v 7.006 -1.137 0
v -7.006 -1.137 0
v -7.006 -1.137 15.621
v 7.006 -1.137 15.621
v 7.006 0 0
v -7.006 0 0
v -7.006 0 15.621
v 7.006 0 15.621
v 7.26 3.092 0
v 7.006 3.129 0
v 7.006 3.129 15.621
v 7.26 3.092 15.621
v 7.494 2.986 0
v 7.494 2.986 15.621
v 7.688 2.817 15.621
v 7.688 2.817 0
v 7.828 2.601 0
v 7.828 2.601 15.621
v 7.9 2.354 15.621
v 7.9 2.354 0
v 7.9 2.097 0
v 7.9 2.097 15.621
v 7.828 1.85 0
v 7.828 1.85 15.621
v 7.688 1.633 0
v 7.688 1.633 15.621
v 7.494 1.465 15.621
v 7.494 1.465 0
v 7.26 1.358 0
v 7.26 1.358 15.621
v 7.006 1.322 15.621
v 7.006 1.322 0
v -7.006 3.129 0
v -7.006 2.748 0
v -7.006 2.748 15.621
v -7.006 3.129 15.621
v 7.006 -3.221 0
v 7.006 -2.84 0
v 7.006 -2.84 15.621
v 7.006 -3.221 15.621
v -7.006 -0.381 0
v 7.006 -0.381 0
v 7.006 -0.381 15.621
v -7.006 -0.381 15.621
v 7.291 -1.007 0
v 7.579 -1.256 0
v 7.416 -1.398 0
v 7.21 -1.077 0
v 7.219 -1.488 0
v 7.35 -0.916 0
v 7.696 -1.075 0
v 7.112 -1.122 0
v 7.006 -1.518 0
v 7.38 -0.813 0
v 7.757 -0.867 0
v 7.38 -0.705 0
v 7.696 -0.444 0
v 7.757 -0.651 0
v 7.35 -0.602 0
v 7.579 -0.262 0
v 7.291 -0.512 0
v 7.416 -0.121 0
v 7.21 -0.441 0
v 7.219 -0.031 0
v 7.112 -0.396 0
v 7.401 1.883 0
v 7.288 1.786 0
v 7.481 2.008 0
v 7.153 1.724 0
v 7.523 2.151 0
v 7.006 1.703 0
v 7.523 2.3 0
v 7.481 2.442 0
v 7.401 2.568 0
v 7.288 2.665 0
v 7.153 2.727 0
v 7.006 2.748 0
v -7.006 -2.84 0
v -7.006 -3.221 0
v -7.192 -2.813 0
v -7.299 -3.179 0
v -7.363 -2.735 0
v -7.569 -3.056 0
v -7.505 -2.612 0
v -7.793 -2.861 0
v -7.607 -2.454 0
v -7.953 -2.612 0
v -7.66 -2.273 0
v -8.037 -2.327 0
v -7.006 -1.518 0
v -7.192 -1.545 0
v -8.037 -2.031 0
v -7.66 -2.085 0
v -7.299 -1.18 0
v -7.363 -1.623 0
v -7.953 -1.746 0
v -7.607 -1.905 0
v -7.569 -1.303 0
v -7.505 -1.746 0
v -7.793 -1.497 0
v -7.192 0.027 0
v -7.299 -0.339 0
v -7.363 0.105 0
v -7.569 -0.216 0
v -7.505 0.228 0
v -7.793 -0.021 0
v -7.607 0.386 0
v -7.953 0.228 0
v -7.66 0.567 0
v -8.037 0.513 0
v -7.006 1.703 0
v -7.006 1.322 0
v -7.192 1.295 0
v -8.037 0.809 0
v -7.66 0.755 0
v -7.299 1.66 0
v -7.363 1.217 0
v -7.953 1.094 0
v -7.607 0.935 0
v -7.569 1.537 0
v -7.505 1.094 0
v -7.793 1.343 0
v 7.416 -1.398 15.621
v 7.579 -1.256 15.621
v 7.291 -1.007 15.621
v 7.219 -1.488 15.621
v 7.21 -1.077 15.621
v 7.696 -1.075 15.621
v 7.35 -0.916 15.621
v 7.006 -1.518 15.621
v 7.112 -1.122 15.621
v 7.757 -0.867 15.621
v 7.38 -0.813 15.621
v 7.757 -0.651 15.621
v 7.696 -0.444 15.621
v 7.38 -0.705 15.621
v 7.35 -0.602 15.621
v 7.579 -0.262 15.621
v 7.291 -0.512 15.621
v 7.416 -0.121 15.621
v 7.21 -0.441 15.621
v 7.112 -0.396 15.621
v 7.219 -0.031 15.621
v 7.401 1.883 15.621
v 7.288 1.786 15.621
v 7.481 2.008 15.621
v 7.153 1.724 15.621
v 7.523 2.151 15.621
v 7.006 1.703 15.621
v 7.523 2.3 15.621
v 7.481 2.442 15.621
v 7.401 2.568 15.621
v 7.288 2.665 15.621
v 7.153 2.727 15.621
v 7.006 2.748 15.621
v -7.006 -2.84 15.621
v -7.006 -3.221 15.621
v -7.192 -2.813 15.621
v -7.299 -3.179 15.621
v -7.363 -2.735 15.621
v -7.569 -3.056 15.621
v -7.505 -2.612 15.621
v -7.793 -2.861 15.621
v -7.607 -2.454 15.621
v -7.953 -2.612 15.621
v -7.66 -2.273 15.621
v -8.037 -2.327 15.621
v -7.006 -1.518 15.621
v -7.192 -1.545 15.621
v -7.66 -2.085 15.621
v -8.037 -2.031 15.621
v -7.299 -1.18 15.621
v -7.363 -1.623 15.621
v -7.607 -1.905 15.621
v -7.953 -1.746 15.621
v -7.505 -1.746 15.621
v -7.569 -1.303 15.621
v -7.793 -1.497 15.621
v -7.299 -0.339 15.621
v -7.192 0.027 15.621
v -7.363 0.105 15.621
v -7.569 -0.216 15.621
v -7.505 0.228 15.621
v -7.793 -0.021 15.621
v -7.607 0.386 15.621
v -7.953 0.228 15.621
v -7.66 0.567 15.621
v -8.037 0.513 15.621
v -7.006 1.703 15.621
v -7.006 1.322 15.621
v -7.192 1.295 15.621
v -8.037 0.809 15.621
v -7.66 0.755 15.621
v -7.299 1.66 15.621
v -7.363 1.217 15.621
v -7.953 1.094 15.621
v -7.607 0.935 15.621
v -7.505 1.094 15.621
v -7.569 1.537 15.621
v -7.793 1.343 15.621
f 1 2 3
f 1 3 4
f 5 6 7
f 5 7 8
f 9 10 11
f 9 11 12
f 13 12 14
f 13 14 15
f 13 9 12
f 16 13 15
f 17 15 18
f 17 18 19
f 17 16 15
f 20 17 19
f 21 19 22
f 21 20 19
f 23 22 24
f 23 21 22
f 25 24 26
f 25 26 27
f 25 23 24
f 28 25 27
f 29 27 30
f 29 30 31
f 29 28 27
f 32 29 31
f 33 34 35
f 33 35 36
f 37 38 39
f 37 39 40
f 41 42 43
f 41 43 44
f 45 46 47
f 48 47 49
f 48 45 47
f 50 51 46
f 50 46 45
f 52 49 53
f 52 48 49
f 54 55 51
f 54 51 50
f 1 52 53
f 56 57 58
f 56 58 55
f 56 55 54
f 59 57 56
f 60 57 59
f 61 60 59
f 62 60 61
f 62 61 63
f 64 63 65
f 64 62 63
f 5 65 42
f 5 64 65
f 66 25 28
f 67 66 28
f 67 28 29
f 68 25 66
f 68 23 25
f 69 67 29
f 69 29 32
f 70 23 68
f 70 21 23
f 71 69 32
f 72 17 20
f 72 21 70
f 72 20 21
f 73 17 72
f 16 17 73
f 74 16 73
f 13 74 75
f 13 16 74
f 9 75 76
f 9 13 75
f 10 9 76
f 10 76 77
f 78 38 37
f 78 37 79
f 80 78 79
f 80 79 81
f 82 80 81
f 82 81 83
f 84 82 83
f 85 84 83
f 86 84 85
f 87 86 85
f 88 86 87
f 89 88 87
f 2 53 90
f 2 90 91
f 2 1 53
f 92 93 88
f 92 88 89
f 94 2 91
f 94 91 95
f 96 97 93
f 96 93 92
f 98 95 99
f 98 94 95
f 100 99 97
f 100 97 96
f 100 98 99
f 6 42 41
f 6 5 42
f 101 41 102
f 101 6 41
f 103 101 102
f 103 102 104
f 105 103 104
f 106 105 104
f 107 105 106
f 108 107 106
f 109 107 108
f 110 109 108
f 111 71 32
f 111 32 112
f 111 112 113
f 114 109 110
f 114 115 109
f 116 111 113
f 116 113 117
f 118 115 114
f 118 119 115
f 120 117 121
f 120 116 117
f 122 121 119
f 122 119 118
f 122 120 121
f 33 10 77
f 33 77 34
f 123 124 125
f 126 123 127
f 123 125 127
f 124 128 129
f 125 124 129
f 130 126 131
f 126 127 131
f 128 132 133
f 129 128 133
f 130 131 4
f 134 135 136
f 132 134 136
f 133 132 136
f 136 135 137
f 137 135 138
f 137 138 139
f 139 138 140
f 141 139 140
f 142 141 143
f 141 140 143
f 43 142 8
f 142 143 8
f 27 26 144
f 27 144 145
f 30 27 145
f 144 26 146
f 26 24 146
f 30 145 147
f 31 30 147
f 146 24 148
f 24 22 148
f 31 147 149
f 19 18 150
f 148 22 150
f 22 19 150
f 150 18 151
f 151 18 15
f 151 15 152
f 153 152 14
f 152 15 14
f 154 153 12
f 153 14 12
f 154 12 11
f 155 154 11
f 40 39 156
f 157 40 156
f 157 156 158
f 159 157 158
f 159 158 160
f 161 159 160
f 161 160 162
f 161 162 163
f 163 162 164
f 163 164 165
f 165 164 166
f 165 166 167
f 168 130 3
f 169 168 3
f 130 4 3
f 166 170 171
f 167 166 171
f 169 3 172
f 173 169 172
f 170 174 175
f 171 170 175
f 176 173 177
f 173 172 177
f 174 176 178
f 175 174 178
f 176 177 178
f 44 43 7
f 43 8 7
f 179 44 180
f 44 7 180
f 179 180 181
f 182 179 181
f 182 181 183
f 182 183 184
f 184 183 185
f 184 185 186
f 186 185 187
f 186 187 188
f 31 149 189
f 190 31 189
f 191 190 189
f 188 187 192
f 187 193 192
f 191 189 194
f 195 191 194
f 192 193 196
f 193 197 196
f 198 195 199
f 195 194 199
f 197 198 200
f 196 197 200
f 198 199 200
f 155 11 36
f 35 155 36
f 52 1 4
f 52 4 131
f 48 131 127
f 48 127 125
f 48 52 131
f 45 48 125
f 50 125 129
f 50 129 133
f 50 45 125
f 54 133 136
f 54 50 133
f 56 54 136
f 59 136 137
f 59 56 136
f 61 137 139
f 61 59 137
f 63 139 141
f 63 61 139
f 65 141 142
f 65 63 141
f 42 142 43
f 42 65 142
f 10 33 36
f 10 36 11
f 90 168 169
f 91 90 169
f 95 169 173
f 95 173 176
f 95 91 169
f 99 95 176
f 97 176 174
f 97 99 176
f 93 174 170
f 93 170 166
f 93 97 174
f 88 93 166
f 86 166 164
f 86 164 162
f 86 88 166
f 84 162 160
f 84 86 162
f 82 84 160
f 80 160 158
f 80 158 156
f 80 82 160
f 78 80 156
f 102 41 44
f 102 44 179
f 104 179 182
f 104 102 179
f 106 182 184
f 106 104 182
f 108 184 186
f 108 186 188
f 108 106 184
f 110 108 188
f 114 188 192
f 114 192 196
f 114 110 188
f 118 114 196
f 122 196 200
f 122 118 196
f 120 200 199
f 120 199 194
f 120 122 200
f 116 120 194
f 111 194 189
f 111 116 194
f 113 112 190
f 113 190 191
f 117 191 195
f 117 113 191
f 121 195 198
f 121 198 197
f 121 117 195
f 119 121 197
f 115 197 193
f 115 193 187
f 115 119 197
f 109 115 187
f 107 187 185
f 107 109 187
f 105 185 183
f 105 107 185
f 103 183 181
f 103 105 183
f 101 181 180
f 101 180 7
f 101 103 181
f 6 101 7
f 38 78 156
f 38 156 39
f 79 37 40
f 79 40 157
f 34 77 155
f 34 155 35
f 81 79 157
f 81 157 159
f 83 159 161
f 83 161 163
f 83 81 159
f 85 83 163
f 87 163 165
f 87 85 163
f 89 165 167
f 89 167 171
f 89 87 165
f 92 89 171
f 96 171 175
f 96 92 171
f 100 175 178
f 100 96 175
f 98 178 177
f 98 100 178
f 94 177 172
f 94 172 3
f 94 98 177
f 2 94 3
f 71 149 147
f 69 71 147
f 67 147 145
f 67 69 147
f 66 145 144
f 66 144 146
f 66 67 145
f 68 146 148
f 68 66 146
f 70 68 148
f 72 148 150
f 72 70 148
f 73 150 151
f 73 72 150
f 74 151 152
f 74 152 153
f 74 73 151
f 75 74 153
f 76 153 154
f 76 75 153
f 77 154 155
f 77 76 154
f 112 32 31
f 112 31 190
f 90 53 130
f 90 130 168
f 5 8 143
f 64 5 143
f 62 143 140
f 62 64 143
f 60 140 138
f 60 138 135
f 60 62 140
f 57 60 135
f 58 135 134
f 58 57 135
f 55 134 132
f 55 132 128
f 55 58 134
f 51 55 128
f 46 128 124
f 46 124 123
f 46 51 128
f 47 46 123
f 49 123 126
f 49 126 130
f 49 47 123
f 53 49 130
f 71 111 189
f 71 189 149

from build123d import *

# Parameters (mm, degrees)
BOSS_EXTRUDE1_DEPTH = 15.621


with BuildPart() as part:
    # Sketch1 → Boss-Extrude1 (new body)
    with BuildSketch(Plane.XY):
        with BuildLine():
            Line((-7.005505105, 0), (7.005505105, 0))
            ThreePointArc((7.005505105, 0), (7.764711356, -0.759206251), (7.005505105, -1.518412501))
            Line((7.005505105, -1.518412501), (-7.005505105, -1.518412501))
            ThreePointArc((-7.005505105, -1.518412501), (-7.666300268, -2.179207663), (-7.005505105, -2.840002826))
            Line((-7.005505105, -2.840002826), (7.005505105, -2.840002826))
            Line((7.005505105, -2.840002826), (7.005505105, -3.221002826))
            Line((7.005505105, -3.221002826), (-7.005505105, -3.221002826))
            ThreePointArc((-7.005505105, -3.221002826), (-8.047300268, -2.179207663), (-7.005505105, -1.137412501))
            Line((-7.005505105, -1.137412501), (7.005505105, -1.137412501))
            ThreePointArc((7.005505105, -1.137412501), (7.383711356, -0.759206251), (7.005505105, -0.381))
            Line((7.005505105, -0.381), (-7.005505105, -0.381))
            ThreePointArc((-7.005505105, -0.381), (-8.047300268, 0.660795162), (-7.005505105, 1.702590324))
            Line((-7.005505105, 1.702590324), (7.005505105, 1.702590324))
            ThreePointArc((7.005505105, 1.702590324), (7.528208531, 2.225293749), (7.005505105, 2.747997174))
            Line((7.005505105, 2.747997174), (-7.005505105, 2.747997174))
            Line((-7.005505105, 2.747997174), (-7.005505105, 3.128997174))
            Line((-7.005505105, 3.128997174), (7.005505105, 3.128997174))
            ThreePointArc((7.005505105, 3.128997174), (7.909208531, 2.225293749), (7.005505105, 1.321590324))
            Line((7.005505105, 1.321590324), (-7.005505105, 1.321590324))
            ThreePointArc((-7.005505105, 1.321590324), (-7.666300268, 0.660795162), (-7.005505105, 0))
        make_face()
    extrude(amount=BOSS_EXTRUDE1_DEPTH)


solid = part.part
